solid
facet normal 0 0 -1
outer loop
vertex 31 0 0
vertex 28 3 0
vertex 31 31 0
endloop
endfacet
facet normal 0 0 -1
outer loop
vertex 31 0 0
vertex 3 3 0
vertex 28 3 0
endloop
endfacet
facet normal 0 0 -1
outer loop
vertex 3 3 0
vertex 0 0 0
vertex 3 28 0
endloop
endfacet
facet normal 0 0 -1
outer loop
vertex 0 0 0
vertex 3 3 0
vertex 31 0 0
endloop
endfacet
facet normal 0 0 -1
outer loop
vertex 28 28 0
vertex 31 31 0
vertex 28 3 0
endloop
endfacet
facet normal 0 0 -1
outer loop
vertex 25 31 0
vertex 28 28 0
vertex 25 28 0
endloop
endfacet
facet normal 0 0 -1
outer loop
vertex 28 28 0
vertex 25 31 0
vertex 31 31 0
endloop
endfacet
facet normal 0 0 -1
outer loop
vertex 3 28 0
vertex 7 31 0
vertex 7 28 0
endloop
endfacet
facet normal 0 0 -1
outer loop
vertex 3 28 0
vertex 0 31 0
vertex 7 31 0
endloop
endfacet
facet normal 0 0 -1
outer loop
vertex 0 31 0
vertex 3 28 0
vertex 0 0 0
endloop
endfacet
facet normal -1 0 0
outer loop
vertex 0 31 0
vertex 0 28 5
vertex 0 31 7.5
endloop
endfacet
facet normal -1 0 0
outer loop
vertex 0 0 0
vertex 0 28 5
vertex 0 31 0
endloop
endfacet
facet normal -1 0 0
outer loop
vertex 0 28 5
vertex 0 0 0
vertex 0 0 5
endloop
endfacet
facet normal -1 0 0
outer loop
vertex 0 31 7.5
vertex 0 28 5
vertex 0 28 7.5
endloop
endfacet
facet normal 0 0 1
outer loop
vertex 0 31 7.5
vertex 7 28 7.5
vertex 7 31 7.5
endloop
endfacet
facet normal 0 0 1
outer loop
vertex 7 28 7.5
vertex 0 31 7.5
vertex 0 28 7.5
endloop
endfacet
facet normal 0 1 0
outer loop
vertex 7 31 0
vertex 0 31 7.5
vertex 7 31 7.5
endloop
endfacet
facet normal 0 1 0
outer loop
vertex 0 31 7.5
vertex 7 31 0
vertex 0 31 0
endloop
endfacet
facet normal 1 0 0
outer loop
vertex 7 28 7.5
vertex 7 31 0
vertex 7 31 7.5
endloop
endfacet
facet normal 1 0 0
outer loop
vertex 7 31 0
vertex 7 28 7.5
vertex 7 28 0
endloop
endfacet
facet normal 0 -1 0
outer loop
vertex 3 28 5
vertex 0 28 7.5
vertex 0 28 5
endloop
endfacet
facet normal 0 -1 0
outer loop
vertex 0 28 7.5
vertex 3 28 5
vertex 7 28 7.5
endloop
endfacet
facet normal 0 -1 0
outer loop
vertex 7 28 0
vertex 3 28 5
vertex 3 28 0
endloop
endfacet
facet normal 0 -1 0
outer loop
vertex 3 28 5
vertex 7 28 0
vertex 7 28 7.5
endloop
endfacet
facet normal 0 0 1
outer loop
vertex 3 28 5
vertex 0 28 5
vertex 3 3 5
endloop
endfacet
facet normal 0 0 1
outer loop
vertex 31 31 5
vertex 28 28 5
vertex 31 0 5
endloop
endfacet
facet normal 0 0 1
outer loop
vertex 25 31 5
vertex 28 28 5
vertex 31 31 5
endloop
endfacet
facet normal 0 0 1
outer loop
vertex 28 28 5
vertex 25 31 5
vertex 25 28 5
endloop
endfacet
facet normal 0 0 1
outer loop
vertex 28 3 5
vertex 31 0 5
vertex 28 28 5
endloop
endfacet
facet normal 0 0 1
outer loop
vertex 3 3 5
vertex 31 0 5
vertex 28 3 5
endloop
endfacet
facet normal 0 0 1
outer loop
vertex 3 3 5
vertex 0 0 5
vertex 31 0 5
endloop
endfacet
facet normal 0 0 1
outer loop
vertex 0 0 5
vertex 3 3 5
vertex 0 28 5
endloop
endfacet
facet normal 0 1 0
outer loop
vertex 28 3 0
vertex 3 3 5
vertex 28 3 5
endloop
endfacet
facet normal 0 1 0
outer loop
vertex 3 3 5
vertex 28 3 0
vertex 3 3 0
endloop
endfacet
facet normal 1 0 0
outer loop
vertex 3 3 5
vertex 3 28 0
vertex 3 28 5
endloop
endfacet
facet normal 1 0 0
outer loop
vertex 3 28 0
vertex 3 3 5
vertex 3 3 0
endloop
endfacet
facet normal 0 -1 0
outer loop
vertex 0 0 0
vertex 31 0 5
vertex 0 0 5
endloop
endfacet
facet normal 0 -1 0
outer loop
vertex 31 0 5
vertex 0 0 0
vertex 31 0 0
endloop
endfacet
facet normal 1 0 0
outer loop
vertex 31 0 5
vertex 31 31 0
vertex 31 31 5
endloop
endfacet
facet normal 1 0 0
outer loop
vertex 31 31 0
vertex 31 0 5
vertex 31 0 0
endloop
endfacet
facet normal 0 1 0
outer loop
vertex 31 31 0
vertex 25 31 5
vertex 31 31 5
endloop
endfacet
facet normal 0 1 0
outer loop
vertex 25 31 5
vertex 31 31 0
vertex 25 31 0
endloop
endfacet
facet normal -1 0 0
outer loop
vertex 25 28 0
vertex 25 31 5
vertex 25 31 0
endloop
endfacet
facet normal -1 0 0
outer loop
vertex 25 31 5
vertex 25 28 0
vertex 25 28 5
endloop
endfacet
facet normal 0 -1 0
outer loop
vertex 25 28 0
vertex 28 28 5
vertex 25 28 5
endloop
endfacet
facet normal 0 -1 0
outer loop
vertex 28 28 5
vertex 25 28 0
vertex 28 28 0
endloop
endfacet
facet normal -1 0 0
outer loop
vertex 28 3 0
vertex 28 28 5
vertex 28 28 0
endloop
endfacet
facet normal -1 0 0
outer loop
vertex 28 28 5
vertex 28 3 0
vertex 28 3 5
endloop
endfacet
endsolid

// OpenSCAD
// file: ../lib/utils.scad
module cone(r, angle, invert=false) {
    h = tan((180 - angle) / 2) * r;
    translate([0, 0, -h]) {
        if (invert) {
                cylinder(r1=r,r2=0,h=h, $fn=20); 
        } else {
            cylinder(r1=0,r2=r,h=h, $fn=20); 
        }
    }
}

module roundrect(vect, r, $fn=20) {
    sq = len(vect) > 1
        ? [for (i = [0:1:len(vect)-1]) vect[i] - r * 2]
        : vect - r * 2;
    minkowski() {
        square(sq);
        translate([r, r])
            circle(r=r);
    }
}

module screw(r, d, l, head, head_d, cap, angle, $fn=20) {
    radius = r > 0 ? r : d / 2;
    head_r = head > 0 ? head : head_d / 2;

    union() {
        if (angle) {
            translate([0, 0, l])
                cone(head_r, angle, false);
        }
        linear_extrude(l)
            circle(r=radius);
        if (cap > 0) {
            translate([0, 0, l - cap])
                linear_extrude(cap)
                    circle(r=head_r);
        }
    }
}

module inset_screw(r, d, l, head, head_d, cap, angle, inset, $fn=20) {
    screw_height = l - inset;
    head_r = head > 0 ? head : head_d / 2;

    union() {
        screw(
            r=r,
            d=d,
            l=screw_height,
            head=head_r,
            cap=cap,
            angle=angle,
            $fn=$fn
        );
        translate([0, 0, screw_height])
            linear_extrude(inset)
                circle(r=head_r);
    }
}

function inch_to_mm(inches) = inches * 25.4;
function increase(vec, amt) = [for (i = vec) i + amt];
// main file
// Porch Gutter Anti-Drip for Small Improvised Gutter
// by Nathan Wittstock <nate@fardog.io>

// preview[view: south east, tilt: top diagonal]

use <../lib/utils.scad>;

gutter_width = 25;
gutter_inner_height = 25;
gutter_thickness = 1;

thickness = 3;
width = 5;
clip_overlap = 3;

total_width = gutter_width + thickness*2;
total_height = gutter_inner_height + thickness*2;
cutout_width = gutter_width - clip_overlap;

module profile() {
    difference() {
        square([total_width, total_height]);
        translate([thickness, thickness])
            square([gutter_width, gutter_inner_height]);
        translate([thickness, gutter_inner_height+thickness, 0])
            square([cutout_width, thickness]);
    }
}

module cap() {
    union() {
        square([thickness, thickness*2 + gutter_thickness]);
        translate([thickness, 0, 0])
            square([thickness, thickness]);
    }
}

union () {
    linear_extrude(width) profile();
    difference() {
        translate([0, gutter_inner_height+thickness, 0]) {
            linear_extrude(width + width/2)
                square([thickness*2+gutter_thickness, thickness]);
            translate([thickness, 0, 0])
                linear_extrude(width)
                    square([gutter_thickness, thickness]);
        }

    }
}
